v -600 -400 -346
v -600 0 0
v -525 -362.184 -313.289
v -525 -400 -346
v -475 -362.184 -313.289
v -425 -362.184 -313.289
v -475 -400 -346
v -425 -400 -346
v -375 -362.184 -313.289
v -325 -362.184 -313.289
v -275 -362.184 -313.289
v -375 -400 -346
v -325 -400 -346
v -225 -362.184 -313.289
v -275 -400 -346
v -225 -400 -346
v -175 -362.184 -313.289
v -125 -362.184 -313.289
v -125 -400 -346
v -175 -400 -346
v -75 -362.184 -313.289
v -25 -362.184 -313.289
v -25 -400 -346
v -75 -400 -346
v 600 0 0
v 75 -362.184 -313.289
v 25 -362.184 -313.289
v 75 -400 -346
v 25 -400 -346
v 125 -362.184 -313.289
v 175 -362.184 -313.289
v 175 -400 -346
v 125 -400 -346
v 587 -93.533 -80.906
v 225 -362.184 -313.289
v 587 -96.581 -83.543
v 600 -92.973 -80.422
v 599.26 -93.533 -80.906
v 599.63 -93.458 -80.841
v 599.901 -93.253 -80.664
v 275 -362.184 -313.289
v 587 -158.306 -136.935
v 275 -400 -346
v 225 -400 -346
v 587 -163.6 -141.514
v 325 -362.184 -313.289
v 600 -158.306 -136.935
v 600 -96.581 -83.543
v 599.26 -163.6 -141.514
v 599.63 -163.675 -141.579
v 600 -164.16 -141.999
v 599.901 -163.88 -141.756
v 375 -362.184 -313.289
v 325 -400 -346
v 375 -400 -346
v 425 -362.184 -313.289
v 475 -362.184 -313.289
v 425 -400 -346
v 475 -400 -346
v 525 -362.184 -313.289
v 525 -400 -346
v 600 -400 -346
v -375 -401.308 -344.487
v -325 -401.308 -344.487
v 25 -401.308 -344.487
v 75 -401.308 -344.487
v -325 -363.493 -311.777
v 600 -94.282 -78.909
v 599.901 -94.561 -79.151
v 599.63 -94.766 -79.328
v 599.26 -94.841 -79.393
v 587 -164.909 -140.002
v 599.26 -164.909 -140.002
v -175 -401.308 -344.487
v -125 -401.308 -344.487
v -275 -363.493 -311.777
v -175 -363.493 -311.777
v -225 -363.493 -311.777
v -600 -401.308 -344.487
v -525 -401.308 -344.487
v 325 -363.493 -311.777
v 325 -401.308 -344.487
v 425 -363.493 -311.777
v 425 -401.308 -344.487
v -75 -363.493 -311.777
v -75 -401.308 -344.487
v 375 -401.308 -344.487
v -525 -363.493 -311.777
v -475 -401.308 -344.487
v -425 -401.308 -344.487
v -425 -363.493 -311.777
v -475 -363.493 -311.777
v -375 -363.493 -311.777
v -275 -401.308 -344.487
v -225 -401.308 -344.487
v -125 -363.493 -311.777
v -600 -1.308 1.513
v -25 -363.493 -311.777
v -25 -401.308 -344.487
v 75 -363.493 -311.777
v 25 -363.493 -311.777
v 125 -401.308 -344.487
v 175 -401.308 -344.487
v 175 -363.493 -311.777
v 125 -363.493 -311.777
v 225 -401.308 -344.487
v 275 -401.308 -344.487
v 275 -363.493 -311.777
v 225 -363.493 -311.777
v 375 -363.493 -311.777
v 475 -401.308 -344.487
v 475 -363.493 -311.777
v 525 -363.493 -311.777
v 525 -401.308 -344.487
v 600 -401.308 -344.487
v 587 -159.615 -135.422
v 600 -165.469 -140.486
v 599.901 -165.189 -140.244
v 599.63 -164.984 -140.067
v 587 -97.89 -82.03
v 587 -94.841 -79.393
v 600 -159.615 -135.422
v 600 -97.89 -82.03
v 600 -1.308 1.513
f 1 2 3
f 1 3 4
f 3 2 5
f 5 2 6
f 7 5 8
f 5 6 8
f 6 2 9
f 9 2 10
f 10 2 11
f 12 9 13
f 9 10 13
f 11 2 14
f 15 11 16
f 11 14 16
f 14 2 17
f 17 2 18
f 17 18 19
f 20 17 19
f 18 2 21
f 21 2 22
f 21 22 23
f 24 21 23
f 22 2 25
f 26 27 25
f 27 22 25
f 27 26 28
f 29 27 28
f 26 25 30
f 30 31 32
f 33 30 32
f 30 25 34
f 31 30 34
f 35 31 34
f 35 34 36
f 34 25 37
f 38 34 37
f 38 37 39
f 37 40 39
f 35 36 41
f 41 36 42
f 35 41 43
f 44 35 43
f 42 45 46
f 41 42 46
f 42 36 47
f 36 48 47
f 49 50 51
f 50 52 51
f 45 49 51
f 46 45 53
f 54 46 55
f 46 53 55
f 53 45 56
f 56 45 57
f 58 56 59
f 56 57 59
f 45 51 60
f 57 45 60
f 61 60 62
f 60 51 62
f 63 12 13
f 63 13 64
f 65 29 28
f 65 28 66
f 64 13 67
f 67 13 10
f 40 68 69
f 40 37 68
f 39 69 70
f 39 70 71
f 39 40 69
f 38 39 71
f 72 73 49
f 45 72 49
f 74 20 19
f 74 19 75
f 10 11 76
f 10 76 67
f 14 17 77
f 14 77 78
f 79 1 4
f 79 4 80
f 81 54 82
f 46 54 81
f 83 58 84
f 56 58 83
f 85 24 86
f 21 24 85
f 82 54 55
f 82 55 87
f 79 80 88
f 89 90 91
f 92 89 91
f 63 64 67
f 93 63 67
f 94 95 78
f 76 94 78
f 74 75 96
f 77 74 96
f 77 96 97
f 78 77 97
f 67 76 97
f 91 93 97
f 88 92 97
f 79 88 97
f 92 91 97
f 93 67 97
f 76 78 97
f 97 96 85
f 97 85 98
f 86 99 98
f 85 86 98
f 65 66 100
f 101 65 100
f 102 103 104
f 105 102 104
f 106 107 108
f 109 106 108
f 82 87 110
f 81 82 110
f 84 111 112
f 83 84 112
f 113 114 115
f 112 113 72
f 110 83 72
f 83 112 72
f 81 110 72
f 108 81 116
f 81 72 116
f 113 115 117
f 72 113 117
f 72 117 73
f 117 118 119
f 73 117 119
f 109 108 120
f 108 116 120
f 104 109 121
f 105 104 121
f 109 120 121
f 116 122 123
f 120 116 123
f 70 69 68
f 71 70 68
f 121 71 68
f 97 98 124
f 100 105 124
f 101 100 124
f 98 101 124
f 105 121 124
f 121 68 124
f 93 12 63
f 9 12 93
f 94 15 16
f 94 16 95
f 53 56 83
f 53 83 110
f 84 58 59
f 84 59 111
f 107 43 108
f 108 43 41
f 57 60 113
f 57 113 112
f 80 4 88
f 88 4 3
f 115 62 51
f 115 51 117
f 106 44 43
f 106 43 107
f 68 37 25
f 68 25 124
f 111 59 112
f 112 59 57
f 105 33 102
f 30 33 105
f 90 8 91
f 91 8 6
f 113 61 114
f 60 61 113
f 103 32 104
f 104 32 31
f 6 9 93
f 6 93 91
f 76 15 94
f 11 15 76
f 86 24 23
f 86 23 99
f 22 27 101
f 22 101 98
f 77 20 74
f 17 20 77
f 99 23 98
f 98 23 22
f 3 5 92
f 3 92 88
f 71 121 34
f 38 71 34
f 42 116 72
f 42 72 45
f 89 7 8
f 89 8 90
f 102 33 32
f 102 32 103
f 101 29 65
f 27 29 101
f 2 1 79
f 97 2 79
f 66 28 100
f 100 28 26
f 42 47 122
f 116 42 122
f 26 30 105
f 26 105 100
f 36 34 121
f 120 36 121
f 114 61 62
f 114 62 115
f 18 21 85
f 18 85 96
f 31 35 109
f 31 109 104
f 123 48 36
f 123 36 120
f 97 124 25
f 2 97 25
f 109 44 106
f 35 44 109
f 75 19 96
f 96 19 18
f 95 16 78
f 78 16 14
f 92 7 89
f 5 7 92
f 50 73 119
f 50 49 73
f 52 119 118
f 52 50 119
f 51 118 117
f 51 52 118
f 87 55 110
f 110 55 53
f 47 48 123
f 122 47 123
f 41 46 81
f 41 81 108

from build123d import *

# Parameters (mm, degrees)
BASE_FLANGE1_DEPTH = 600
SKETCH2_W          = 50
SKETCH2_H          = 50
CUT_EXTRUDE1_DEPTH = 10
CUT_EXTRUDE2_DEPTH = 13
FILLET1_R          = 0.74


# Sheet-metal steps are written as plain solids
with BuildPart() as part:
    # Sketch1 → Base-Flange1 (new, symmetric)
    with BuildSketch(Plane(origin=(0, 0, 0), x_dir=(0, 0, -1), z_dir=(1, 0, 0))):
        Polygon((0, 0), (346, -400), (344.487374796, -401.308420801), (-1.512625204, -1.308420801), align=None)
    extrude(amount=BASE_FLANGE1_DEPTH, both=True)

    # Sketch2 → Cut-Extrude1 (cut)
    with BuildSketch(Plane(origin=(0, 0, 0), x_dir=(-1, 0, 0), z_dir=(0, 0.6542104006098486, -0.7563126018610966))):
        with Locations((-500, -503.881839355)):
            Rectangle(SKETCH2_W, SKETCH2_H)
        with Locations((-400, -503.881839355)):
            Rectangle(SKETCH2_W, SKETCH2_H)
        with Locations((-300, -503.881839355)):
            Rectangle(SKETCH2_W, SKETCH2_H)
        with Locations((-200, -503.881839355)):
            Rectangle(SKETCH2_W, SKETCH2_H)
        with Locations((-100, -503.881839355)):
            Rectangle(SKETCH2_W, SKETCH2_H)
        with Locations((0, -503.881839355)):
            Rectangle(SKETCH2_W, SKETCH2_H)
        with Locations((100, -503.881839355)):
            Rectangle(SKETCH2_W, SKETCH2_H)
        with Locations((200, -503.881839355)):
            Rectangle(SKETCH2_W, SKETCH2_H)
        with Locations((300, -503.881839355)):
            Rectangle(SKETCH2_W, SKETCH2_H)
        with Locations((400, -503.881839355)):
            Rectangle(SKETCH2_W, SKETCH2_H)
        with Locations((500, -503.881839355)):
            Rectangle(SKETCH2_W, SKETCH2_H)
    extrude(amount=-CUT_EXTRUDE1_DEPTH, mode=Mode.SUBTRACT)

    # Sketch3 → Cut-Extrude2 (cut)
    with BuildSketch(Plane(origin=(600, 0, 0), x_dir=(0, 0, -1), z_dir=(1, 0, 0))):
        Polygon((136.934944411, -158.306294117), (135.422319207, -159.614714918), (140.001792012, -164.908903131), (141.514417215, -163.60048233), align=None)
        Polygon((80.905870334, -93.532798074), (83.542993835, -96.581495763), (82.030368632, -97.889916565), (79.39324513, -94.841218875), align=None)
    extrude(amount=-CUT_EXTRUDE2_DEPTH, mode=Mode.SUBTRACT)

    # Fillet1
    fillet1_edges = [part.edges().sort_by_distance(p)[0] for p in [
        (600, -164.254692731, -140.758104614),
        (600, -94.187008475, -80.149557732),
    ]]
    fillet(fillet1_edges, radius=FILLET1_R)


solid = part.part
